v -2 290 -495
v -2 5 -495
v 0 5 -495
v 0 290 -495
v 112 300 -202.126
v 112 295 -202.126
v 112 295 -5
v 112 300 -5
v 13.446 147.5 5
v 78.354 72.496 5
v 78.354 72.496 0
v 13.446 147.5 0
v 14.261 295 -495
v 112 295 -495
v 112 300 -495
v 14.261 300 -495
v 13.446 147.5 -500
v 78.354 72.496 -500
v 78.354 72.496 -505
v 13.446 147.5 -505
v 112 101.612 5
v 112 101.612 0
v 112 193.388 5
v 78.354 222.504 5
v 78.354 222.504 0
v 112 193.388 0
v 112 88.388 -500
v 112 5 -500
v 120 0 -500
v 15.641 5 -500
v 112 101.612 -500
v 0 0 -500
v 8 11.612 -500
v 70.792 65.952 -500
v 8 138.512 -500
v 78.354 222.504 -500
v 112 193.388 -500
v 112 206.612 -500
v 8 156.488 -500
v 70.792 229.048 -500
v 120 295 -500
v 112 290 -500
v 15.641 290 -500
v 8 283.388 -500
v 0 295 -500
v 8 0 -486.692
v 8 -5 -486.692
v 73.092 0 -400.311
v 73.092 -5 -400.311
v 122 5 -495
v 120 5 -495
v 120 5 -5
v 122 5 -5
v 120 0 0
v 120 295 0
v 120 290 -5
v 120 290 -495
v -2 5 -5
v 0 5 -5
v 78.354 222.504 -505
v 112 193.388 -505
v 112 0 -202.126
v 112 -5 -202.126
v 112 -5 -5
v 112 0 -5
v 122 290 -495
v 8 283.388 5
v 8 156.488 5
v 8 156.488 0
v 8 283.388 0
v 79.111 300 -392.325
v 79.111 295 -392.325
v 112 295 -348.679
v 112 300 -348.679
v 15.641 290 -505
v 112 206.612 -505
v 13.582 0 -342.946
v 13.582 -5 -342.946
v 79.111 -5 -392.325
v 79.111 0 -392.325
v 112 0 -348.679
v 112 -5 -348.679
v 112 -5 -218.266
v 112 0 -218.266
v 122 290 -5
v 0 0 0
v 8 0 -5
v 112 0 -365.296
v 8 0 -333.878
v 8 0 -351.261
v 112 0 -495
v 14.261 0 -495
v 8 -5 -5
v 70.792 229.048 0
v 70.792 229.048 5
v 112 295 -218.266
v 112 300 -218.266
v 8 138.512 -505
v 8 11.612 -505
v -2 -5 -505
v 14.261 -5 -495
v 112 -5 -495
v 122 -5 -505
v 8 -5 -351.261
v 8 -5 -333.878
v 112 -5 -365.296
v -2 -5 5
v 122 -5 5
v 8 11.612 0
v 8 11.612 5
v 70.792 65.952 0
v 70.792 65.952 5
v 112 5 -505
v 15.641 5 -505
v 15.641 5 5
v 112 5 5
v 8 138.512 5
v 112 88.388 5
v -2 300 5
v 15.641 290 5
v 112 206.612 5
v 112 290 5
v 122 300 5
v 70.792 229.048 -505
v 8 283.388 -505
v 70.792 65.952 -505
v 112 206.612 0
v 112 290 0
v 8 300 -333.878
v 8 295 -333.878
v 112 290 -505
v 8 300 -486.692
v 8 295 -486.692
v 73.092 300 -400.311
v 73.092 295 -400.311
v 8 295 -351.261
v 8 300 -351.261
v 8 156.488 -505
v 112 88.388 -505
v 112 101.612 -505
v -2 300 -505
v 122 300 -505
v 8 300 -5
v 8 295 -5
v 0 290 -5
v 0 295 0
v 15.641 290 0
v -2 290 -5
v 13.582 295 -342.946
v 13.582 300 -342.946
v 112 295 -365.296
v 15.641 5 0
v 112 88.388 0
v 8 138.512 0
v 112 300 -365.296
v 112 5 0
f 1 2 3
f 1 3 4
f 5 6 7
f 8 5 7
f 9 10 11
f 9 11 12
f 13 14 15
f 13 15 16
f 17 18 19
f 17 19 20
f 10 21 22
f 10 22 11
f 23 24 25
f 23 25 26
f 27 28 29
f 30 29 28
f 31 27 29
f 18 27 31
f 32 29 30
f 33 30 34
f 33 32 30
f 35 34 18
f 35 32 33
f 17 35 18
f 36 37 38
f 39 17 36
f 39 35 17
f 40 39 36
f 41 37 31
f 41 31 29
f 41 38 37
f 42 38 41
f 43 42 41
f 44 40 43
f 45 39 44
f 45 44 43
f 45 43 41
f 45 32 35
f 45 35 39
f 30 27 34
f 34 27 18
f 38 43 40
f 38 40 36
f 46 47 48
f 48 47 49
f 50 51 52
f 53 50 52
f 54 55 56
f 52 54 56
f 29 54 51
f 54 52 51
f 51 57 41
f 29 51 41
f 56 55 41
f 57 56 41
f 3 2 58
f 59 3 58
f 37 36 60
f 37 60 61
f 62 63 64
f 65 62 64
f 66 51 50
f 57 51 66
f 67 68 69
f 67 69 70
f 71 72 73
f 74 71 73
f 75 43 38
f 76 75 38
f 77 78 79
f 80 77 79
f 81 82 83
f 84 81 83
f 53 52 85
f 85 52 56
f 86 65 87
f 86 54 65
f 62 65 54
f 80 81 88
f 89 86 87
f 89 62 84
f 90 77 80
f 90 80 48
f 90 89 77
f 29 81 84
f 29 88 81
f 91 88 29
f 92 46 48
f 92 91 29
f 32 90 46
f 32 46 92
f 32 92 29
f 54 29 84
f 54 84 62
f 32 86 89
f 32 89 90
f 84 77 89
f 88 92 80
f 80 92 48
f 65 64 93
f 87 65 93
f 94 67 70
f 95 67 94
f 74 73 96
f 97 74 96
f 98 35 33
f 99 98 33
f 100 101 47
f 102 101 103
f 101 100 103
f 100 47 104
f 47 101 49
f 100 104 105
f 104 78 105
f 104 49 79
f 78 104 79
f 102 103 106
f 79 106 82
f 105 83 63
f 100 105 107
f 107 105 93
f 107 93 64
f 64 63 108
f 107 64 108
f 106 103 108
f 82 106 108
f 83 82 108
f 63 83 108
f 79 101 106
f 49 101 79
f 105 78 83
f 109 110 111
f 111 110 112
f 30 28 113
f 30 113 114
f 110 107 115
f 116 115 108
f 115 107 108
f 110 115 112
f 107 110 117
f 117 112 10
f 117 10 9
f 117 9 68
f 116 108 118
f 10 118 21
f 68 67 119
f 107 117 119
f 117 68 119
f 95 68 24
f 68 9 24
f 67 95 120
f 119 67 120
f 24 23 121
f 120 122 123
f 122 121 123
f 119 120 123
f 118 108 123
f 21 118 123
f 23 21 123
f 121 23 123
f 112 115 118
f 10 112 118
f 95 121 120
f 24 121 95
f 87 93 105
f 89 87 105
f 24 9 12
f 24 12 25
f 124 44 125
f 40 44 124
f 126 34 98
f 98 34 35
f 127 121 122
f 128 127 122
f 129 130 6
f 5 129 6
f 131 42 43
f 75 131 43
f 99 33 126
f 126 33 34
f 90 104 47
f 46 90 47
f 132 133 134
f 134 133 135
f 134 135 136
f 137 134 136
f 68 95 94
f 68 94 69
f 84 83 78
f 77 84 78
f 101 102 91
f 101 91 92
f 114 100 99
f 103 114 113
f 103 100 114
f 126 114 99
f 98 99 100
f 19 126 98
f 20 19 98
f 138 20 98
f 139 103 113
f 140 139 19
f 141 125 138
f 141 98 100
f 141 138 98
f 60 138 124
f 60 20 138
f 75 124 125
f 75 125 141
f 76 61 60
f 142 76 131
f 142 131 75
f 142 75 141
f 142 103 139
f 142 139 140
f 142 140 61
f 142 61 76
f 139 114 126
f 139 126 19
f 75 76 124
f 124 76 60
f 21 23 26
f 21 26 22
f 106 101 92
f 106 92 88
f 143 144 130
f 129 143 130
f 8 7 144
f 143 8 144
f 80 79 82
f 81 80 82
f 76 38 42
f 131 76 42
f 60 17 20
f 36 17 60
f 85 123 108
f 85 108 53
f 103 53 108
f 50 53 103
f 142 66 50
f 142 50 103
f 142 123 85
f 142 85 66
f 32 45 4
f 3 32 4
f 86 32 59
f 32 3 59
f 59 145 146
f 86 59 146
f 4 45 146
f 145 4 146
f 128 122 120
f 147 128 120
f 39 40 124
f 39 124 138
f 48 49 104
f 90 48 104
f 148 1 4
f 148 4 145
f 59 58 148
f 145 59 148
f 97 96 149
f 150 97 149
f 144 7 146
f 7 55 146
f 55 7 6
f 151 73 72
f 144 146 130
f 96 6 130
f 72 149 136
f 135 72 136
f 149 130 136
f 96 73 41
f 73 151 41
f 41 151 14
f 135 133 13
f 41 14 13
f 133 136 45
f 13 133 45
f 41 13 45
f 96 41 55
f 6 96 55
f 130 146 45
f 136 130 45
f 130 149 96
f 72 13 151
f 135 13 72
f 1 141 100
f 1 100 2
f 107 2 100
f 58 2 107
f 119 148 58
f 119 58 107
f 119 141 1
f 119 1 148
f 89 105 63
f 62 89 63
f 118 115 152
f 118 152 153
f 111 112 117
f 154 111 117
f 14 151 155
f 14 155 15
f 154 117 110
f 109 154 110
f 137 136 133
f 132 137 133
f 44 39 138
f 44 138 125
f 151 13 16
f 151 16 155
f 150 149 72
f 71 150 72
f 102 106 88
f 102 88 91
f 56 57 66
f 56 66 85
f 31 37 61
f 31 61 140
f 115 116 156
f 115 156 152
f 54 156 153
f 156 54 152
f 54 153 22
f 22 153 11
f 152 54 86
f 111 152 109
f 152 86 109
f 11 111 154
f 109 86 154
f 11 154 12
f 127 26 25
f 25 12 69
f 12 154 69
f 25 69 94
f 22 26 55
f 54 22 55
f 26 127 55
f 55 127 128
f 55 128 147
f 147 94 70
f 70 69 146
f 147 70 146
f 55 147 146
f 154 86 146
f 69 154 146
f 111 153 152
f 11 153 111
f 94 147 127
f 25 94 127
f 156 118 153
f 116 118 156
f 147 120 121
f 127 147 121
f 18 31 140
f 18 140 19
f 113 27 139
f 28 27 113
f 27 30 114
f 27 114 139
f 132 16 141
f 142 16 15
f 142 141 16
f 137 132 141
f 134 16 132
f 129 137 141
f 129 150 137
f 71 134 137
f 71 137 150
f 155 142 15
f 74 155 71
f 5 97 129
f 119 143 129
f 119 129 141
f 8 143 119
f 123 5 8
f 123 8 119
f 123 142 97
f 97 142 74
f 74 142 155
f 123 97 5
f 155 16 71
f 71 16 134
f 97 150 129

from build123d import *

# Parameters (mm, degrees)
SKETCH1_W           = 510
SKETCH1_H           = 305
SKETCH1_W_2         = 500
SKETCH1_H_2         = 295
BOSS_EXTRUDE1_DEPTH = 120
SKETCH2_W           = 510
SKETCH2_H           = 305
BOSS_EXTRUDE2_DEPTH = 2
SKETCH3_W           = 510
SKETCH3_H           = 305
BOSS_EXTRUDE3_DEPTH = 2
CUT_EXTRUDE1_DEPTH  = 306
SKETCH5_W           = 490
SKETCH5_H           = 285
CUT_EXTRUDE4_DEPTH  = 125
CUT_EXTRUDE5_DEPTH  = 511


with BuildPart() as part:
    # Sketch1 → Boss-Extrude1 (new body)
    with BuildSketch(Plane(origin=(0, 0, 0), x_dir=(0, 0, -1), z_dir=(1, 0, 0))):
        with Locations((250, 147.5)):
            Rectangle(SKETCH1_W, SKETCH1_H)
        with Locations((250, 147.5)):
            Rectangle(SKETCH1_W_2, SKETCH1_H_2, mode=Mode.SUBTRACT)
    extrude(amount=BOSS_EXTRUDE1_DEPTH)

    # Sketch2 → Boss-Extrude2 (add)
    with BuildSketch(Plane(origin=(120, 0, 0), x_dir=(0, 0, -1), z_dir=(1, 0, 0))):
        with Locations((250, 147.5)):
            Rectangle(SKETCH2_W, SKETCH2_H)
    extrude(amount=BOSS_EXTRUDE2_DEPTH)

    # Sketch3 → Boss-Extrude3 (add)
    with BuildSketch(Plane.ZY):
        with Locations((-250, 147.5)):
            Rectangle(SKETCH3_W, SKETCH3_H)
    extrude(amount=BOSS_EXTRUDE3_DEPTH)

    # Sketch4 → Cut-Extrude1 (cut, through all)
    with BuildSketch(Plane.XZ.offset(5)):
        Polygon((14.260678291, -495), (112, -365.295539257), (112, -495), align=None)
        Polygon((73.092374529, -400.311300748), (8, -351.260678291), (8, -486.691799294), align=None)
        Polygon((79.110524761, -392.324945648), (112, -348.679137846), (112, -218.265533068), (13.582159118, -342.945780321), align=None)
        Polygon((8, -333.877817445), (112, -202.125834287), (112, -5), (8, -5), align=None)
    extrude(amount=-CUT_EXTRUDE1_DEPTH, mode=Mode.SUBTRACT)

    # Sketch5 → Cut-Extrude4 (cut, through all)
    with BuildSketch(Plane.ZY.offset(2)):
        with Locations((-250, 147.5)):
            Rectangle(SKETCH5_W, SKETCH5_H)
    extrude(amount=-CUT_EXTRUDE4_DEPTH, mode=Mode.SUBTRACT)

    # Sketch8 → Cut-Extrude5 (cut, through all)
    with BuildSketch(Plane.XY.offset(5)):
        Polygon((15.640858332, 5), (112, 88.387718751), (112, 5), align=None)
        Polygon((70.792299268, 65.951771), (8, 138.511761264), (8, 11.612281249), align=None)
        Polygon((78.353986092, 222.504461556), (112, 193.387718751), (112, 101.612281249), (78.353986092, 72.495538444), (13.446278977, 147.5), align=None)
        Polygon((70.792299268, 229.048229), (8, 156.488238736), (8, 283.387718751), align=None)
        Polygon((15.640858332, 290), (112, 206.612281249), (112, 290), align=None)
    extrude(amount=-CUT_EXTRUDE5_DEPTH, mode=Mode.SUBTRACT)


solid = part.part
